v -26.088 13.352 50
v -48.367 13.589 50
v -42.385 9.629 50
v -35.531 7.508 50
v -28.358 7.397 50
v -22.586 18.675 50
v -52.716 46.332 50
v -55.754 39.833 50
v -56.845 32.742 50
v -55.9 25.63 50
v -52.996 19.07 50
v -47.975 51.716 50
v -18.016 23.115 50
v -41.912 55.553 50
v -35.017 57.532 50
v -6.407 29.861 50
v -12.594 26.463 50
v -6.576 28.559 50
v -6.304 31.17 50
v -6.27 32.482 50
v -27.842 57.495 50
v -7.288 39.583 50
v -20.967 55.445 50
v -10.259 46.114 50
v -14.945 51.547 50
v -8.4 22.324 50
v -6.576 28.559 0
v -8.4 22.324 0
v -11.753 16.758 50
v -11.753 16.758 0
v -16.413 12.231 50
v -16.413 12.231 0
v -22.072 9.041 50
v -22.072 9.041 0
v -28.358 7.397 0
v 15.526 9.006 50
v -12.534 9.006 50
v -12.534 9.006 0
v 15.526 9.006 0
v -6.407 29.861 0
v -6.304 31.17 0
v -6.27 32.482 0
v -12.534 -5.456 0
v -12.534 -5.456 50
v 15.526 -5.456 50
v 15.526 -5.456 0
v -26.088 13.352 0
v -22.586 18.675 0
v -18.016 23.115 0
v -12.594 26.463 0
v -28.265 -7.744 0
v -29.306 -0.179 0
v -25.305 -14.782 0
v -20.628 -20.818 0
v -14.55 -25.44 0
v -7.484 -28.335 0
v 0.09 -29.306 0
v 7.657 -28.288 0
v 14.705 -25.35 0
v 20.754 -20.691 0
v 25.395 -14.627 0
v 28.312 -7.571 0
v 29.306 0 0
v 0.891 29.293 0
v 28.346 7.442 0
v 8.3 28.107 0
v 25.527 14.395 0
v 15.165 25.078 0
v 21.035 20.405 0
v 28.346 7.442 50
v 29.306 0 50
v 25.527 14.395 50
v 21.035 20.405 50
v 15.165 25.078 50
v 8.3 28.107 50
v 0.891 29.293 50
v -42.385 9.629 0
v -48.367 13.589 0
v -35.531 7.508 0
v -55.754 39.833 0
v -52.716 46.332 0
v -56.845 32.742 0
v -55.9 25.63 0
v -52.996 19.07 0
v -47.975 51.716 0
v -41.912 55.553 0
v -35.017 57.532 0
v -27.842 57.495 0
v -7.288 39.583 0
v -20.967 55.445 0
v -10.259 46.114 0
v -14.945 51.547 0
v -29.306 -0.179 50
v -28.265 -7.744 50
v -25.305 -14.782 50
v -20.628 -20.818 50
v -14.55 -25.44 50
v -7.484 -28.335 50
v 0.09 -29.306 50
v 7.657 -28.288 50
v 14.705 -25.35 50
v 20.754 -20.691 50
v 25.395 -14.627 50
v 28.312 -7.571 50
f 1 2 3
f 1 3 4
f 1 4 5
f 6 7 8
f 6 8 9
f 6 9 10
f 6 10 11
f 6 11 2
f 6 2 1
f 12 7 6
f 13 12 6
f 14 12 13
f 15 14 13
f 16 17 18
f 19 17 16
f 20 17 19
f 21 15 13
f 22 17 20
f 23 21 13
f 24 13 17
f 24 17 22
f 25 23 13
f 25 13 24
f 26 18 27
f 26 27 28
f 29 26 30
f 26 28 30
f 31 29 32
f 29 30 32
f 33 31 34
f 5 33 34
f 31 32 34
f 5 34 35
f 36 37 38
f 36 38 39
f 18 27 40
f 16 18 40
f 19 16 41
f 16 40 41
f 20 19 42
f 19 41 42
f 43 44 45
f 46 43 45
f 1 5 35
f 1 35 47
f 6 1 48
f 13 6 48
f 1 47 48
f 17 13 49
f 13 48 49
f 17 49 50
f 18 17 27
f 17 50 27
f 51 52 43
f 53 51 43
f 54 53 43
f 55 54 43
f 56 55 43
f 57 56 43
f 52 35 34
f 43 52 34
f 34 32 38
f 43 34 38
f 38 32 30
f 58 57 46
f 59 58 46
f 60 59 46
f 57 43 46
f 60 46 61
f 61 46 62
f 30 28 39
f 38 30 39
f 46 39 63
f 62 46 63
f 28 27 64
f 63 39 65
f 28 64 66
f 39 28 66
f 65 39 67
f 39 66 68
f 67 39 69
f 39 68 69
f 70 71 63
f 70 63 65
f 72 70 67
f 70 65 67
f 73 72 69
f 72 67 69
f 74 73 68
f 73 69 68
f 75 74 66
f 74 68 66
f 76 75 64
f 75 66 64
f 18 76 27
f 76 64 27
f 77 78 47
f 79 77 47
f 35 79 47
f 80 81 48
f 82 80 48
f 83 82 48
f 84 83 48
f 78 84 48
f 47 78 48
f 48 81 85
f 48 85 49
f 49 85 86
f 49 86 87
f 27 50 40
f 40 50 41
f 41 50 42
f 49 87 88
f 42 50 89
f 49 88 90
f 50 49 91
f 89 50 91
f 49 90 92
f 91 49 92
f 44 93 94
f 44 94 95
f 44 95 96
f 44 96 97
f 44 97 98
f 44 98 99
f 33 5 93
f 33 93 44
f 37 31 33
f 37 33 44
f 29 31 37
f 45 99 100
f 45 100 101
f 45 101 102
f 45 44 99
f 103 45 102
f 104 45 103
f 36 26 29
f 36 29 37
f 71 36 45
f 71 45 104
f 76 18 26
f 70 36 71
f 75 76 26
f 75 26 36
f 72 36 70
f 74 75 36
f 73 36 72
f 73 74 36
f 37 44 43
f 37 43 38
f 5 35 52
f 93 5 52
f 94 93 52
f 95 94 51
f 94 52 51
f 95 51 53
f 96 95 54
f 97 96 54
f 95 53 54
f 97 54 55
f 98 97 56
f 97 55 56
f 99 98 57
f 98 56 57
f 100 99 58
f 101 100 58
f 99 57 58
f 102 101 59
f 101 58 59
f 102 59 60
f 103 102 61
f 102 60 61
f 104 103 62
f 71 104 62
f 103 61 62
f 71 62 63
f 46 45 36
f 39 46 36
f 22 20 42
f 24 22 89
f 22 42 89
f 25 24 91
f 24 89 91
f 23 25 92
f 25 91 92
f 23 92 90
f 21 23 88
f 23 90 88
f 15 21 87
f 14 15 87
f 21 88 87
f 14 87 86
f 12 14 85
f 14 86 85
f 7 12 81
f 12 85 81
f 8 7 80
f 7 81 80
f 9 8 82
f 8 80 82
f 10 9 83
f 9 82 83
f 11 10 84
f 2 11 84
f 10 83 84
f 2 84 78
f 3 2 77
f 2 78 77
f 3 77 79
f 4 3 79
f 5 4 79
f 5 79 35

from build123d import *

# Parameters (mm, degrees)
F1_DEPTH = 50
F2_W     = 28.0598
F2_H     = 14.462667
F3_DEPTH = 77


with BuildPart() as f1:
    # F0 (on Top) → F1 (new body)
    with BuildSketch(Plane.XY):
        with BuildLine():
            ThreePointArc((-28.357509, 7.39738), (-20.421797, 21.019509), (-6.576468, 28.559055))
            ThreePointArc((-6.576468, 28.559055), (-6.347003, 30.51446), (-6.27036, 32.481791))
            ThreePointArc((-6.27036, 32.481791), (-50.537185, 49.193088), (-28.357509, 7.39738))
        make_face()
        with BuildLine():
            ThreePointArc((-28.357509, 7.39738), (-3.729, -29.068266), (29.306476, 0))
            ThreePointArc((29.306476, 0), (18.250157, 22.930358), (-6.576468, 28.559055))
            ThreePointArc((-6.576468, 28.559055), (-13.936713, 14.344617), (-28.357509, 7.39738))
        make_face()
    extrude(amount=F1_DEPTH)

    # F2 (on face) → F3 (cut)
    with BuildSketch(Plane.XY.offset(50)):
        with Locations((1.496094, 1.774865)):
            Rectangle(F2_W, F2_H)
    extrude(amount=-F3_DEPTH, mode=Mode.SUBTRACT)


solid = f1.part
